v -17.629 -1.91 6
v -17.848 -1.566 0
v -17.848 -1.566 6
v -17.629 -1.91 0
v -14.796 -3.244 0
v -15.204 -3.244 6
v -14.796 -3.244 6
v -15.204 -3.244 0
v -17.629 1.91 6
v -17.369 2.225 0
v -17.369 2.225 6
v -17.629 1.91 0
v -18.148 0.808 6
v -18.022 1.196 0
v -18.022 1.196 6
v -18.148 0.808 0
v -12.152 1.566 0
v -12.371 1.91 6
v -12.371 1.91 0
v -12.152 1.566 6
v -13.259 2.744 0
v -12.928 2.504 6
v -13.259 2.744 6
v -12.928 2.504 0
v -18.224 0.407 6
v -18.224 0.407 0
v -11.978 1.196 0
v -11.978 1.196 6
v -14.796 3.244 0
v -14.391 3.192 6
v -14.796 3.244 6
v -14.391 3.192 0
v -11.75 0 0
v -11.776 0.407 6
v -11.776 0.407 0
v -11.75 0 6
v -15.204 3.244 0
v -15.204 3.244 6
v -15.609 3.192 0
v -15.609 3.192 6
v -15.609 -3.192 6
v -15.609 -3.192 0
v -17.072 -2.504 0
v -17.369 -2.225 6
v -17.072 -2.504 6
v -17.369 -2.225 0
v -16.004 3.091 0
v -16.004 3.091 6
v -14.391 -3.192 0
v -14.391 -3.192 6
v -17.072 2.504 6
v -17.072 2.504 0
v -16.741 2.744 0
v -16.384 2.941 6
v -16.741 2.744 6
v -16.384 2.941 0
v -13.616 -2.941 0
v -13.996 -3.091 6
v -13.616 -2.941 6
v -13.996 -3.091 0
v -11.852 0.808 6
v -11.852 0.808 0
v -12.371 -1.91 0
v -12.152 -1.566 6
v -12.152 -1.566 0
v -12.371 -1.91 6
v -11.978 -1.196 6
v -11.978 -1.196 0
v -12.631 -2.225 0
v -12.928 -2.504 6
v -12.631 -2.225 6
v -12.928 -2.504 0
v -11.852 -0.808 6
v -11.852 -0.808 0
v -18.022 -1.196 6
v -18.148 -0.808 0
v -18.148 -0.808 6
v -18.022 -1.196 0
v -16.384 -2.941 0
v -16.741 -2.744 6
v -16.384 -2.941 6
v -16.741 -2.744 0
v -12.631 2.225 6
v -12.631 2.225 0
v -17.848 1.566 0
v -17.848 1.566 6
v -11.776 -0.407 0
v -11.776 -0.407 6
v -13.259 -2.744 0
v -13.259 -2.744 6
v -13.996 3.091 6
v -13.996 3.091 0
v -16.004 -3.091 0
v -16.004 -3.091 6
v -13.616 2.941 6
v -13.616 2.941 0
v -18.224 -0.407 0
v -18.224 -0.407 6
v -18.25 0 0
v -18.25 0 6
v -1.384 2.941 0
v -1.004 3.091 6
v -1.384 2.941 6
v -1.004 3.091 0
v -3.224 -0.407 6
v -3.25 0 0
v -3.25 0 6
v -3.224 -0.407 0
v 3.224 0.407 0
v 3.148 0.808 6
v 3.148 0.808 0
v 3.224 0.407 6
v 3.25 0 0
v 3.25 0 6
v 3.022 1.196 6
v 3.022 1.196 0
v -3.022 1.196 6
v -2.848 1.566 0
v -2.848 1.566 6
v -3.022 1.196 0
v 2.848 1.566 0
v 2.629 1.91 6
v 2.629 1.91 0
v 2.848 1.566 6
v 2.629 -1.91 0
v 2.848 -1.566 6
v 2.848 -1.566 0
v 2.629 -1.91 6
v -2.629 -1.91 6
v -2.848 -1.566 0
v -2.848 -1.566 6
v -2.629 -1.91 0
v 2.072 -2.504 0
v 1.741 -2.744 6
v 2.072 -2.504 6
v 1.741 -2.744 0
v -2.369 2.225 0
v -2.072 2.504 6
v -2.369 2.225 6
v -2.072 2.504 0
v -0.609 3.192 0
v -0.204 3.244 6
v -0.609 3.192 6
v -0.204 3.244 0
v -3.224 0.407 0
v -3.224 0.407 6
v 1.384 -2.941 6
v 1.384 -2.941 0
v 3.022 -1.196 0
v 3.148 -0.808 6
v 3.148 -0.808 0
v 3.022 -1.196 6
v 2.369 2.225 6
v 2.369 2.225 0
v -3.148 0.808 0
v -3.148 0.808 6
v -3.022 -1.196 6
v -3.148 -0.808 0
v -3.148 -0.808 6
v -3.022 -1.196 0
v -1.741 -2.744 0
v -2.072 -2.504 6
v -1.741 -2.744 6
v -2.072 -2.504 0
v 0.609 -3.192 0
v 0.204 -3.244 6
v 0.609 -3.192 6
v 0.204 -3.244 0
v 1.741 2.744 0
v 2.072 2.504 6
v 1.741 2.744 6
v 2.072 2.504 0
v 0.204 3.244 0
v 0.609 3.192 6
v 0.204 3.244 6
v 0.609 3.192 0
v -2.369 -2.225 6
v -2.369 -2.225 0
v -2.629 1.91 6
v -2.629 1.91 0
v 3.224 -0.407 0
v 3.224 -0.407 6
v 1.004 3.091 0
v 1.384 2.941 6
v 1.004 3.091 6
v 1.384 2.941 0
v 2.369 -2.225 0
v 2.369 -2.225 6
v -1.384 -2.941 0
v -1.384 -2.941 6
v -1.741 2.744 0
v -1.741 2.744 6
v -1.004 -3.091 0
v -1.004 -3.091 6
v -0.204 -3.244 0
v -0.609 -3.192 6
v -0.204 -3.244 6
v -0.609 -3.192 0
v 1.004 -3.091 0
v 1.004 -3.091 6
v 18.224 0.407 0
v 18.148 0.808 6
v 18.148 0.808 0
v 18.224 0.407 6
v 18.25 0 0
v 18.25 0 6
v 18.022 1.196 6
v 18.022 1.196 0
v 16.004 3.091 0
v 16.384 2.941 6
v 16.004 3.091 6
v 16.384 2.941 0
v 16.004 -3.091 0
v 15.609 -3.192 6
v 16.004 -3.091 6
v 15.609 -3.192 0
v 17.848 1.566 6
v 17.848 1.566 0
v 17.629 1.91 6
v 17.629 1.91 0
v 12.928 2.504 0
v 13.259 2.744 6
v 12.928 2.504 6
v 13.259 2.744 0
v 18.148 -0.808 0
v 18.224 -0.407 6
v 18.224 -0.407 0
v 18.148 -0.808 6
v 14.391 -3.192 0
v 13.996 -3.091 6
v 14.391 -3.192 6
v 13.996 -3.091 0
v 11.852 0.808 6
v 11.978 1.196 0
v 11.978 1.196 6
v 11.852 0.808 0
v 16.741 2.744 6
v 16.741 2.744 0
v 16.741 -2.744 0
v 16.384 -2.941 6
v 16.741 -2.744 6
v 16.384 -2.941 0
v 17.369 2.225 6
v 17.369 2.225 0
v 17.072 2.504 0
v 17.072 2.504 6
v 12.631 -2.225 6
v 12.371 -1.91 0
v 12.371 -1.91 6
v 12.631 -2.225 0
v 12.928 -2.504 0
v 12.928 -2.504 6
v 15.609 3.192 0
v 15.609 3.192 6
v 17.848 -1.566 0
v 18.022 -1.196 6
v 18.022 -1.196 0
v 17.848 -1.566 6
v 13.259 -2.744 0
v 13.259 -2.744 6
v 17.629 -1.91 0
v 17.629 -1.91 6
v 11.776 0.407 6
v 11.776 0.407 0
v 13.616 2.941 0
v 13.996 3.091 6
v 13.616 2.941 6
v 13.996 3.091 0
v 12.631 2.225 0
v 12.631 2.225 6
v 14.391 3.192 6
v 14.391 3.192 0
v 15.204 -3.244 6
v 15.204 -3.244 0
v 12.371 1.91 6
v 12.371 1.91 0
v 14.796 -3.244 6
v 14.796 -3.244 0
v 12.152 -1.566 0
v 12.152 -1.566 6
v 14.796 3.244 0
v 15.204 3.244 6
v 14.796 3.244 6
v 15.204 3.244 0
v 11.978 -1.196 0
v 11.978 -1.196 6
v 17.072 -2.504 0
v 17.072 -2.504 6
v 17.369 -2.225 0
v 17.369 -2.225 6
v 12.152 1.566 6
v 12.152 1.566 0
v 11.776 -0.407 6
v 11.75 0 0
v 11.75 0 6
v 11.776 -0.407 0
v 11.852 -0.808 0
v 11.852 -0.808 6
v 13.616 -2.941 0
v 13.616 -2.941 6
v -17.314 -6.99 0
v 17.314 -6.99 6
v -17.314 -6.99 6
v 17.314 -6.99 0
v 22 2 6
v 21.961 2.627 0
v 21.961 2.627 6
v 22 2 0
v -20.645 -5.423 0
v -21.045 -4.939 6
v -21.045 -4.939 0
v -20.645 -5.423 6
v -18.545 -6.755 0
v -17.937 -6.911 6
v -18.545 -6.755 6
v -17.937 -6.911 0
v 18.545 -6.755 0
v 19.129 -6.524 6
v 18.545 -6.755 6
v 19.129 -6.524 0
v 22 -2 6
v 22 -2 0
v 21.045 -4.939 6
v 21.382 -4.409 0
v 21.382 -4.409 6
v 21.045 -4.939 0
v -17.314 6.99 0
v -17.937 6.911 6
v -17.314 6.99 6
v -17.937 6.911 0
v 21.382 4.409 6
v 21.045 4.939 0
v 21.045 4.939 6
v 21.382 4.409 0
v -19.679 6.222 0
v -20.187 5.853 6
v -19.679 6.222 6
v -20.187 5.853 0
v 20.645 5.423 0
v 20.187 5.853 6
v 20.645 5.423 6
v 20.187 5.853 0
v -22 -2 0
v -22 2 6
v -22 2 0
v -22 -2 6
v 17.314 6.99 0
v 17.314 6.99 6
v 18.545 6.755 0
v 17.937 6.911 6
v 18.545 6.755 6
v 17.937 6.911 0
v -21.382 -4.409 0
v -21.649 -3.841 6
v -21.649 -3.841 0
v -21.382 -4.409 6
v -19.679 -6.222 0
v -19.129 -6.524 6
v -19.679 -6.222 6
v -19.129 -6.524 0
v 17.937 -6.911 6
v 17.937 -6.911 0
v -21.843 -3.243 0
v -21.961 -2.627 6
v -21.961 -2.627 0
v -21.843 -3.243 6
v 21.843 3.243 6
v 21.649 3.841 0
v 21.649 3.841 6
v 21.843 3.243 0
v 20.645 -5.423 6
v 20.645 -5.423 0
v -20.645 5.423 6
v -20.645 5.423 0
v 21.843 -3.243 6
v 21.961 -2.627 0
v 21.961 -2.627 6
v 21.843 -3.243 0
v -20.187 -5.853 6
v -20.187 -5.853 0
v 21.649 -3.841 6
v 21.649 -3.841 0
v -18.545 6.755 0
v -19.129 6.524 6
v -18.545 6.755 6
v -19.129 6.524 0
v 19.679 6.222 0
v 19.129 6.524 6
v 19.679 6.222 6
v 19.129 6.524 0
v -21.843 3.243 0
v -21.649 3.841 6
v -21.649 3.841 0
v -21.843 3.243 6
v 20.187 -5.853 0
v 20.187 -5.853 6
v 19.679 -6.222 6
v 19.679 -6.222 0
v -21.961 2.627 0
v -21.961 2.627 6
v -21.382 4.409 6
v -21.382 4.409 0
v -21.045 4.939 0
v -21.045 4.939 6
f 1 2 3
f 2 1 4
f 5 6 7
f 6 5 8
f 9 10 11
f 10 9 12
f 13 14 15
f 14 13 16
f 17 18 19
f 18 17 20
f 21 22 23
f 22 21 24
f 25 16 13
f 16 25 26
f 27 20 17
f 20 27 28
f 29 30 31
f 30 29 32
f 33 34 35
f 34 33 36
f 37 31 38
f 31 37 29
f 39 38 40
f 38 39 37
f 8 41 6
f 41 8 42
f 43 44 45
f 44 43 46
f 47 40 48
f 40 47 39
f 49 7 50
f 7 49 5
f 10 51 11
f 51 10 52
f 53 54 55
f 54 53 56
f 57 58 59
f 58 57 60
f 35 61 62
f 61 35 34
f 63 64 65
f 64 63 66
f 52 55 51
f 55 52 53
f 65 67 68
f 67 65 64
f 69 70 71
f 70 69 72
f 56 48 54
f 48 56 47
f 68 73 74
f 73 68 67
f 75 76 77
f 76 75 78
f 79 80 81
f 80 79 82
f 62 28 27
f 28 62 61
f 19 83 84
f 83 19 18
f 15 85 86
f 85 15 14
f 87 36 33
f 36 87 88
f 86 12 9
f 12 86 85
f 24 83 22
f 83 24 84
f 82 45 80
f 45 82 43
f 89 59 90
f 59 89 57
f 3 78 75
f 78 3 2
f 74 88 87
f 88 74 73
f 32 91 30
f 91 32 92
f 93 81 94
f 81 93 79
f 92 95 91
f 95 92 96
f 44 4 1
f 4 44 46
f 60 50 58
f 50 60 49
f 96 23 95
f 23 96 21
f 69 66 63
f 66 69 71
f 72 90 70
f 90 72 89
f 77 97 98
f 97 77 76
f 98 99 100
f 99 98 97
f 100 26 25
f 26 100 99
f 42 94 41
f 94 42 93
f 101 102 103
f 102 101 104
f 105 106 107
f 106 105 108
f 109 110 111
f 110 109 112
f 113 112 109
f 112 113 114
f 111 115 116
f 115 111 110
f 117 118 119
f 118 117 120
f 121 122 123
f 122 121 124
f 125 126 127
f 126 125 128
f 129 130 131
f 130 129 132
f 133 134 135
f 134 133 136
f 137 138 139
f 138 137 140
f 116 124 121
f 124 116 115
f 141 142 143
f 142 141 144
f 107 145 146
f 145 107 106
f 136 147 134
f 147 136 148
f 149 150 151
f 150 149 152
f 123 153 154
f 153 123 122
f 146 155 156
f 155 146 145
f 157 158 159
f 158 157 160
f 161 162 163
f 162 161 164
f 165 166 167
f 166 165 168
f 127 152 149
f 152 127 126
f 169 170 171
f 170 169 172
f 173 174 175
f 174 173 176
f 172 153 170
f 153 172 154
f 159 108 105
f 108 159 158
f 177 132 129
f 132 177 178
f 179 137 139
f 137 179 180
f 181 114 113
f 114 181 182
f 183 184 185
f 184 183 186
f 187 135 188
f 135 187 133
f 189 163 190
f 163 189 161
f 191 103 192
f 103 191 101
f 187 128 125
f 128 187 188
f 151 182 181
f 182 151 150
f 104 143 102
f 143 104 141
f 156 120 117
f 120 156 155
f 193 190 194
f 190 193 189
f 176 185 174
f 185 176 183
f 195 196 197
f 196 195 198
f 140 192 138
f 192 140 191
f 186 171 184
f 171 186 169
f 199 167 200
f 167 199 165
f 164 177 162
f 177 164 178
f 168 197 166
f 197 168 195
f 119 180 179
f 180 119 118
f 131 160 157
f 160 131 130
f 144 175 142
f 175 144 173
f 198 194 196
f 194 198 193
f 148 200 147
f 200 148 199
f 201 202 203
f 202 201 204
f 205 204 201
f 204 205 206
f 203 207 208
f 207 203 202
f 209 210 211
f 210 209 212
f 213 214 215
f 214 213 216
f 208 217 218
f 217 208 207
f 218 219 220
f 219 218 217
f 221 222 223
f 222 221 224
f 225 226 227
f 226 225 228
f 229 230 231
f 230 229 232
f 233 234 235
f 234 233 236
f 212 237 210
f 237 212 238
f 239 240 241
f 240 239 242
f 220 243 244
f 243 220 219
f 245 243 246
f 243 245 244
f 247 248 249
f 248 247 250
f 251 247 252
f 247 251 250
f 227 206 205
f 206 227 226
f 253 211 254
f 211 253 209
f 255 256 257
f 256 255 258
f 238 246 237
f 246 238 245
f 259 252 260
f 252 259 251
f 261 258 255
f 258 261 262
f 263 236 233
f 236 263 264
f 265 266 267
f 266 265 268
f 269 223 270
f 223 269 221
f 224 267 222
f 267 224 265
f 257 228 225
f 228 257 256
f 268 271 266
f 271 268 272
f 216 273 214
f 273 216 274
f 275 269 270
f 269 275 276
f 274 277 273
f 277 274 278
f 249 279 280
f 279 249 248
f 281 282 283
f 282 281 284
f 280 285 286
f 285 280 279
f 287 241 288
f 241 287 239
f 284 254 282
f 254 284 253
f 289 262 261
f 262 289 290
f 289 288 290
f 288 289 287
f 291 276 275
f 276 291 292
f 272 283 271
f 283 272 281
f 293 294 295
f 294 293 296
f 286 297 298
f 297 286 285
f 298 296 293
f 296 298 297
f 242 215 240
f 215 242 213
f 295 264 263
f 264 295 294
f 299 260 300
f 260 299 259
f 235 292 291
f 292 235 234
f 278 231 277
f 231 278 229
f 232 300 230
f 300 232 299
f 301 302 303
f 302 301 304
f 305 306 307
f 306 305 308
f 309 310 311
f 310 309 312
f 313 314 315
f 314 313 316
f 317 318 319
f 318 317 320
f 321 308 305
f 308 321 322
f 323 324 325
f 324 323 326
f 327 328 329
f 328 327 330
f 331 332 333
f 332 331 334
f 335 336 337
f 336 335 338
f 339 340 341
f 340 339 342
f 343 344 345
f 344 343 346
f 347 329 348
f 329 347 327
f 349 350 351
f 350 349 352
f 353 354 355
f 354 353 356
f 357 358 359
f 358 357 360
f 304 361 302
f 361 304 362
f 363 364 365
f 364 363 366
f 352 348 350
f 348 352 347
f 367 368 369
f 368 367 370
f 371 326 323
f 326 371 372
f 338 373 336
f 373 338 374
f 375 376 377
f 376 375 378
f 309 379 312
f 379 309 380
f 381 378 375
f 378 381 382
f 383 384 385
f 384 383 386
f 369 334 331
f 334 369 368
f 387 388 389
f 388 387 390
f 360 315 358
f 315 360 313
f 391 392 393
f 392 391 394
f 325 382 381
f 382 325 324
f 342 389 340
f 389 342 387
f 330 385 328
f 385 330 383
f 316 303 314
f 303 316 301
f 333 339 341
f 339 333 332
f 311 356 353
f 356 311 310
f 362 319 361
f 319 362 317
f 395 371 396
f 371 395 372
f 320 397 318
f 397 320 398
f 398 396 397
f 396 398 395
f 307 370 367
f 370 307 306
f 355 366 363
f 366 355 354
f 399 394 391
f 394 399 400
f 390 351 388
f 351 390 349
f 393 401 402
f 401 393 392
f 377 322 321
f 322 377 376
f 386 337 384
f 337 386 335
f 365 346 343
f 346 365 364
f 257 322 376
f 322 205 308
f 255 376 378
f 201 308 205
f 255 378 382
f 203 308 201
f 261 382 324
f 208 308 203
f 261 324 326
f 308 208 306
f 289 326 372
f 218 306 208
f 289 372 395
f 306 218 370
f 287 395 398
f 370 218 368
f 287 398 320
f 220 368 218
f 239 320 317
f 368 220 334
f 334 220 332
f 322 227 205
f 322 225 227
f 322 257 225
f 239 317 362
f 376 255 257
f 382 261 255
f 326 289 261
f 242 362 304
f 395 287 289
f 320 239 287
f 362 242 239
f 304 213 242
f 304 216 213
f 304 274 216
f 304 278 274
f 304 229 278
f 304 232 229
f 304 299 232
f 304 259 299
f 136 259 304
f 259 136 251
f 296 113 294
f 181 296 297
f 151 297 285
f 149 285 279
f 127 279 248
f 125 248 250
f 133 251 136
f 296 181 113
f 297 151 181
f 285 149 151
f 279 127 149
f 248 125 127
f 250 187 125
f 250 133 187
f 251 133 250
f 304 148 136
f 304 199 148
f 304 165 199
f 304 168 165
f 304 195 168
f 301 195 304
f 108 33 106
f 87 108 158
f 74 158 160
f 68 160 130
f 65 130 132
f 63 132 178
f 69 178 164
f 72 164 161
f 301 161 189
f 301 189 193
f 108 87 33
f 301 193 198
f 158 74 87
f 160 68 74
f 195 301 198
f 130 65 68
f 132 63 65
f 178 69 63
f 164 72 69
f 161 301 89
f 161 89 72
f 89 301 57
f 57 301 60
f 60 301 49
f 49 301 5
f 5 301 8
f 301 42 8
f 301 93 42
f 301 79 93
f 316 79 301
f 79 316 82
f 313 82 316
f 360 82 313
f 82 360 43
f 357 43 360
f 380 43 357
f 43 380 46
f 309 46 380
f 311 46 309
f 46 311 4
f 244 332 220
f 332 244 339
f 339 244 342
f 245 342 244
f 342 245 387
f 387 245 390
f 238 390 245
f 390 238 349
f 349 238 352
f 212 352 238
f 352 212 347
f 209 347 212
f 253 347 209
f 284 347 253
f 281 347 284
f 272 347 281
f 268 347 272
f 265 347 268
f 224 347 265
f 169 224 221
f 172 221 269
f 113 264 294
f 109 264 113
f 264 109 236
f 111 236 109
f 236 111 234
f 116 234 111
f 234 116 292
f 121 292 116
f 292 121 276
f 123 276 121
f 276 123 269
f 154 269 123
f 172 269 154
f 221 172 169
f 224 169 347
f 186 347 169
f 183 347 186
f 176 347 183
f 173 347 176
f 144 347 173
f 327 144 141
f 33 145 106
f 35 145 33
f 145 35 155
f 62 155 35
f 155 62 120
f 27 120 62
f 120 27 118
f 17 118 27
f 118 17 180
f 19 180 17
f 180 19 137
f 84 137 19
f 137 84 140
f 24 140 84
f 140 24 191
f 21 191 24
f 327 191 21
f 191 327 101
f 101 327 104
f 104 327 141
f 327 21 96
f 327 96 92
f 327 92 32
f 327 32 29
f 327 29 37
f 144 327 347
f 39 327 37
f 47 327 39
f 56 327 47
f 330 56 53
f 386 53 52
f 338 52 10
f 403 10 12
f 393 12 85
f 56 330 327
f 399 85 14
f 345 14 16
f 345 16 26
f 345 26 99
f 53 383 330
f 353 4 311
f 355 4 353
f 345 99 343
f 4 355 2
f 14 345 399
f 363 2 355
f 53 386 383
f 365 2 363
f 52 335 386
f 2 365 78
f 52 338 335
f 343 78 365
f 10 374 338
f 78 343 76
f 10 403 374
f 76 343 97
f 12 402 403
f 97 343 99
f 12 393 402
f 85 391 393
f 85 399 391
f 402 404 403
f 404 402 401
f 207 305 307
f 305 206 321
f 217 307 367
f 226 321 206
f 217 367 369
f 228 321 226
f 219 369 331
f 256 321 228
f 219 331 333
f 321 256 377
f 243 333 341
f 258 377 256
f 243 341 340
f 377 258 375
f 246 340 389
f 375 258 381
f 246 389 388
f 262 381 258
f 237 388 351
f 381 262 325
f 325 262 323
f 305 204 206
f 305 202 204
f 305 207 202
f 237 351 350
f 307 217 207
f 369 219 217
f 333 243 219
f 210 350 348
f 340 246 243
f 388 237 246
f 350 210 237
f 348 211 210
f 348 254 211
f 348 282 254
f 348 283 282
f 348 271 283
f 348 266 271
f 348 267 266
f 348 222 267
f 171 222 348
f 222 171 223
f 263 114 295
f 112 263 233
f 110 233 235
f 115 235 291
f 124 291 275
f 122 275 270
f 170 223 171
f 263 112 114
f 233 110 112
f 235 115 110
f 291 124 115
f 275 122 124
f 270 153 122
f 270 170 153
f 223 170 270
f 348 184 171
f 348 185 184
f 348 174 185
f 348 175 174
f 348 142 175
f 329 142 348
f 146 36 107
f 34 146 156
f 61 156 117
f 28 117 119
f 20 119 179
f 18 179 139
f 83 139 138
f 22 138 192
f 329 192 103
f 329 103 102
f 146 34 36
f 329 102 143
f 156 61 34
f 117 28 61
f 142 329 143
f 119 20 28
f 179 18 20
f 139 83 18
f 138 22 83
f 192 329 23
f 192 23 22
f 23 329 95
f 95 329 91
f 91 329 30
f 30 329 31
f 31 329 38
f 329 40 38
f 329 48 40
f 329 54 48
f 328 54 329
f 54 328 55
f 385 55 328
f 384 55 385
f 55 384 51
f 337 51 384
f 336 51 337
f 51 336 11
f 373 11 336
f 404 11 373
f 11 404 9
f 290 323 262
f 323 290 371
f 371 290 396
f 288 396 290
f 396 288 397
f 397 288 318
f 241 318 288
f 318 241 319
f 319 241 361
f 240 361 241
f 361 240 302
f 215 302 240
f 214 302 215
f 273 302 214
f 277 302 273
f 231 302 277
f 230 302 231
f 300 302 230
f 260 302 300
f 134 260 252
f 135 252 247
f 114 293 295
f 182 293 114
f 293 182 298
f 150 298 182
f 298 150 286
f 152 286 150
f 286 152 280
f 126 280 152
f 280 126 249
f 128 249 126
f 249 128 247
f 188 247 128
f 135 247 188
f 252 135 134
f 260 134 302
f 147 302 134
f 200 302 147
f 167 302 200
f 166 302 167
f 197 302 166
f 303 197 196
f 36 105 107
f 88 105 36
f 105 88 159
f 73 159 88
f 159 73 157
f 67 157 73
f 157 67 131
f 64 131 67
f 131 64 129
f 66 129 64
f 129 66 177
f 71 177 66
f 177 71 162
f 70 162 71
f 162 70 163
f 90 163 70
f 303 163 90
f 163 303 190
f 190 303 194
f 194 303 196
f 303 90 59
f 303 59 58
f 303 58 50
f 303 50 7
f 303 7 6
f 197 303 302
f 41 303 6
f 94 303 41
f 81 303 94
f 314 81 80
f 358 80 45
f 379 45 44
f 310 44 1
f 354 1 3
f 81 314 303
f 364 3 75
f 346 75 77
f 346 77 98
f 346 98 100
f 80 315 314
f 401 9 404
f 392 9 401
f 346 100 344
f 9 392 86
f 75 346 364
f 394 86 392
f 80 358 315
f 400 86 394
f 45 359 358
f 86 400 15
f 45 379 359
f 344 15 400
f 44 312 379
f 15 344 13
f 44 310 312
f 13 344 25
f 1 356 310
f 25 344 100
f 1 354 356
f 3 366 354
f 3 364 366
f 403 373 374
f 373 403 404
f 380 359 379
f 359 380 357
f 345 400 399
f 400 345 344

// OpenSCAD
$fn = 50;


difference() {
	union() {
		hull() {
			translate(v = [-17.0000000000, 2.0000000000, 0]) {
				cylinder(h = 6, r = 5);
			}
			translate(v = [17.0000000000, 2.0000000000, 0]) {
				cylinder(h = 6, r = 5);
			}
			translate(v = [-17.0000000000, -2.0000000000, 0]) {
				cylinder(h = 6, r = 5);
			}
			translate(v = [17.0000000000, -2.0000000000, 0]) {
				cylinder(h = 6, r = 5);
			}
		}
	}
	union() {
		translate(v = [-15.0000000000, 0.0000000000, -100.0000000000]) {
			cylinder(h = 200, r = 3.2500000000);
		}
		translate(v = [0.0000000000, 0.0000000000, -100.0000000000]) {
			cylinder(h = 200, r = 3.2500000000);
		}
		translate(v = [15.0000000000, 0.0000000000, -100.0000000000]) {
			cylinder(h = 200, r = 3.2500000000);
		}
	}
}
